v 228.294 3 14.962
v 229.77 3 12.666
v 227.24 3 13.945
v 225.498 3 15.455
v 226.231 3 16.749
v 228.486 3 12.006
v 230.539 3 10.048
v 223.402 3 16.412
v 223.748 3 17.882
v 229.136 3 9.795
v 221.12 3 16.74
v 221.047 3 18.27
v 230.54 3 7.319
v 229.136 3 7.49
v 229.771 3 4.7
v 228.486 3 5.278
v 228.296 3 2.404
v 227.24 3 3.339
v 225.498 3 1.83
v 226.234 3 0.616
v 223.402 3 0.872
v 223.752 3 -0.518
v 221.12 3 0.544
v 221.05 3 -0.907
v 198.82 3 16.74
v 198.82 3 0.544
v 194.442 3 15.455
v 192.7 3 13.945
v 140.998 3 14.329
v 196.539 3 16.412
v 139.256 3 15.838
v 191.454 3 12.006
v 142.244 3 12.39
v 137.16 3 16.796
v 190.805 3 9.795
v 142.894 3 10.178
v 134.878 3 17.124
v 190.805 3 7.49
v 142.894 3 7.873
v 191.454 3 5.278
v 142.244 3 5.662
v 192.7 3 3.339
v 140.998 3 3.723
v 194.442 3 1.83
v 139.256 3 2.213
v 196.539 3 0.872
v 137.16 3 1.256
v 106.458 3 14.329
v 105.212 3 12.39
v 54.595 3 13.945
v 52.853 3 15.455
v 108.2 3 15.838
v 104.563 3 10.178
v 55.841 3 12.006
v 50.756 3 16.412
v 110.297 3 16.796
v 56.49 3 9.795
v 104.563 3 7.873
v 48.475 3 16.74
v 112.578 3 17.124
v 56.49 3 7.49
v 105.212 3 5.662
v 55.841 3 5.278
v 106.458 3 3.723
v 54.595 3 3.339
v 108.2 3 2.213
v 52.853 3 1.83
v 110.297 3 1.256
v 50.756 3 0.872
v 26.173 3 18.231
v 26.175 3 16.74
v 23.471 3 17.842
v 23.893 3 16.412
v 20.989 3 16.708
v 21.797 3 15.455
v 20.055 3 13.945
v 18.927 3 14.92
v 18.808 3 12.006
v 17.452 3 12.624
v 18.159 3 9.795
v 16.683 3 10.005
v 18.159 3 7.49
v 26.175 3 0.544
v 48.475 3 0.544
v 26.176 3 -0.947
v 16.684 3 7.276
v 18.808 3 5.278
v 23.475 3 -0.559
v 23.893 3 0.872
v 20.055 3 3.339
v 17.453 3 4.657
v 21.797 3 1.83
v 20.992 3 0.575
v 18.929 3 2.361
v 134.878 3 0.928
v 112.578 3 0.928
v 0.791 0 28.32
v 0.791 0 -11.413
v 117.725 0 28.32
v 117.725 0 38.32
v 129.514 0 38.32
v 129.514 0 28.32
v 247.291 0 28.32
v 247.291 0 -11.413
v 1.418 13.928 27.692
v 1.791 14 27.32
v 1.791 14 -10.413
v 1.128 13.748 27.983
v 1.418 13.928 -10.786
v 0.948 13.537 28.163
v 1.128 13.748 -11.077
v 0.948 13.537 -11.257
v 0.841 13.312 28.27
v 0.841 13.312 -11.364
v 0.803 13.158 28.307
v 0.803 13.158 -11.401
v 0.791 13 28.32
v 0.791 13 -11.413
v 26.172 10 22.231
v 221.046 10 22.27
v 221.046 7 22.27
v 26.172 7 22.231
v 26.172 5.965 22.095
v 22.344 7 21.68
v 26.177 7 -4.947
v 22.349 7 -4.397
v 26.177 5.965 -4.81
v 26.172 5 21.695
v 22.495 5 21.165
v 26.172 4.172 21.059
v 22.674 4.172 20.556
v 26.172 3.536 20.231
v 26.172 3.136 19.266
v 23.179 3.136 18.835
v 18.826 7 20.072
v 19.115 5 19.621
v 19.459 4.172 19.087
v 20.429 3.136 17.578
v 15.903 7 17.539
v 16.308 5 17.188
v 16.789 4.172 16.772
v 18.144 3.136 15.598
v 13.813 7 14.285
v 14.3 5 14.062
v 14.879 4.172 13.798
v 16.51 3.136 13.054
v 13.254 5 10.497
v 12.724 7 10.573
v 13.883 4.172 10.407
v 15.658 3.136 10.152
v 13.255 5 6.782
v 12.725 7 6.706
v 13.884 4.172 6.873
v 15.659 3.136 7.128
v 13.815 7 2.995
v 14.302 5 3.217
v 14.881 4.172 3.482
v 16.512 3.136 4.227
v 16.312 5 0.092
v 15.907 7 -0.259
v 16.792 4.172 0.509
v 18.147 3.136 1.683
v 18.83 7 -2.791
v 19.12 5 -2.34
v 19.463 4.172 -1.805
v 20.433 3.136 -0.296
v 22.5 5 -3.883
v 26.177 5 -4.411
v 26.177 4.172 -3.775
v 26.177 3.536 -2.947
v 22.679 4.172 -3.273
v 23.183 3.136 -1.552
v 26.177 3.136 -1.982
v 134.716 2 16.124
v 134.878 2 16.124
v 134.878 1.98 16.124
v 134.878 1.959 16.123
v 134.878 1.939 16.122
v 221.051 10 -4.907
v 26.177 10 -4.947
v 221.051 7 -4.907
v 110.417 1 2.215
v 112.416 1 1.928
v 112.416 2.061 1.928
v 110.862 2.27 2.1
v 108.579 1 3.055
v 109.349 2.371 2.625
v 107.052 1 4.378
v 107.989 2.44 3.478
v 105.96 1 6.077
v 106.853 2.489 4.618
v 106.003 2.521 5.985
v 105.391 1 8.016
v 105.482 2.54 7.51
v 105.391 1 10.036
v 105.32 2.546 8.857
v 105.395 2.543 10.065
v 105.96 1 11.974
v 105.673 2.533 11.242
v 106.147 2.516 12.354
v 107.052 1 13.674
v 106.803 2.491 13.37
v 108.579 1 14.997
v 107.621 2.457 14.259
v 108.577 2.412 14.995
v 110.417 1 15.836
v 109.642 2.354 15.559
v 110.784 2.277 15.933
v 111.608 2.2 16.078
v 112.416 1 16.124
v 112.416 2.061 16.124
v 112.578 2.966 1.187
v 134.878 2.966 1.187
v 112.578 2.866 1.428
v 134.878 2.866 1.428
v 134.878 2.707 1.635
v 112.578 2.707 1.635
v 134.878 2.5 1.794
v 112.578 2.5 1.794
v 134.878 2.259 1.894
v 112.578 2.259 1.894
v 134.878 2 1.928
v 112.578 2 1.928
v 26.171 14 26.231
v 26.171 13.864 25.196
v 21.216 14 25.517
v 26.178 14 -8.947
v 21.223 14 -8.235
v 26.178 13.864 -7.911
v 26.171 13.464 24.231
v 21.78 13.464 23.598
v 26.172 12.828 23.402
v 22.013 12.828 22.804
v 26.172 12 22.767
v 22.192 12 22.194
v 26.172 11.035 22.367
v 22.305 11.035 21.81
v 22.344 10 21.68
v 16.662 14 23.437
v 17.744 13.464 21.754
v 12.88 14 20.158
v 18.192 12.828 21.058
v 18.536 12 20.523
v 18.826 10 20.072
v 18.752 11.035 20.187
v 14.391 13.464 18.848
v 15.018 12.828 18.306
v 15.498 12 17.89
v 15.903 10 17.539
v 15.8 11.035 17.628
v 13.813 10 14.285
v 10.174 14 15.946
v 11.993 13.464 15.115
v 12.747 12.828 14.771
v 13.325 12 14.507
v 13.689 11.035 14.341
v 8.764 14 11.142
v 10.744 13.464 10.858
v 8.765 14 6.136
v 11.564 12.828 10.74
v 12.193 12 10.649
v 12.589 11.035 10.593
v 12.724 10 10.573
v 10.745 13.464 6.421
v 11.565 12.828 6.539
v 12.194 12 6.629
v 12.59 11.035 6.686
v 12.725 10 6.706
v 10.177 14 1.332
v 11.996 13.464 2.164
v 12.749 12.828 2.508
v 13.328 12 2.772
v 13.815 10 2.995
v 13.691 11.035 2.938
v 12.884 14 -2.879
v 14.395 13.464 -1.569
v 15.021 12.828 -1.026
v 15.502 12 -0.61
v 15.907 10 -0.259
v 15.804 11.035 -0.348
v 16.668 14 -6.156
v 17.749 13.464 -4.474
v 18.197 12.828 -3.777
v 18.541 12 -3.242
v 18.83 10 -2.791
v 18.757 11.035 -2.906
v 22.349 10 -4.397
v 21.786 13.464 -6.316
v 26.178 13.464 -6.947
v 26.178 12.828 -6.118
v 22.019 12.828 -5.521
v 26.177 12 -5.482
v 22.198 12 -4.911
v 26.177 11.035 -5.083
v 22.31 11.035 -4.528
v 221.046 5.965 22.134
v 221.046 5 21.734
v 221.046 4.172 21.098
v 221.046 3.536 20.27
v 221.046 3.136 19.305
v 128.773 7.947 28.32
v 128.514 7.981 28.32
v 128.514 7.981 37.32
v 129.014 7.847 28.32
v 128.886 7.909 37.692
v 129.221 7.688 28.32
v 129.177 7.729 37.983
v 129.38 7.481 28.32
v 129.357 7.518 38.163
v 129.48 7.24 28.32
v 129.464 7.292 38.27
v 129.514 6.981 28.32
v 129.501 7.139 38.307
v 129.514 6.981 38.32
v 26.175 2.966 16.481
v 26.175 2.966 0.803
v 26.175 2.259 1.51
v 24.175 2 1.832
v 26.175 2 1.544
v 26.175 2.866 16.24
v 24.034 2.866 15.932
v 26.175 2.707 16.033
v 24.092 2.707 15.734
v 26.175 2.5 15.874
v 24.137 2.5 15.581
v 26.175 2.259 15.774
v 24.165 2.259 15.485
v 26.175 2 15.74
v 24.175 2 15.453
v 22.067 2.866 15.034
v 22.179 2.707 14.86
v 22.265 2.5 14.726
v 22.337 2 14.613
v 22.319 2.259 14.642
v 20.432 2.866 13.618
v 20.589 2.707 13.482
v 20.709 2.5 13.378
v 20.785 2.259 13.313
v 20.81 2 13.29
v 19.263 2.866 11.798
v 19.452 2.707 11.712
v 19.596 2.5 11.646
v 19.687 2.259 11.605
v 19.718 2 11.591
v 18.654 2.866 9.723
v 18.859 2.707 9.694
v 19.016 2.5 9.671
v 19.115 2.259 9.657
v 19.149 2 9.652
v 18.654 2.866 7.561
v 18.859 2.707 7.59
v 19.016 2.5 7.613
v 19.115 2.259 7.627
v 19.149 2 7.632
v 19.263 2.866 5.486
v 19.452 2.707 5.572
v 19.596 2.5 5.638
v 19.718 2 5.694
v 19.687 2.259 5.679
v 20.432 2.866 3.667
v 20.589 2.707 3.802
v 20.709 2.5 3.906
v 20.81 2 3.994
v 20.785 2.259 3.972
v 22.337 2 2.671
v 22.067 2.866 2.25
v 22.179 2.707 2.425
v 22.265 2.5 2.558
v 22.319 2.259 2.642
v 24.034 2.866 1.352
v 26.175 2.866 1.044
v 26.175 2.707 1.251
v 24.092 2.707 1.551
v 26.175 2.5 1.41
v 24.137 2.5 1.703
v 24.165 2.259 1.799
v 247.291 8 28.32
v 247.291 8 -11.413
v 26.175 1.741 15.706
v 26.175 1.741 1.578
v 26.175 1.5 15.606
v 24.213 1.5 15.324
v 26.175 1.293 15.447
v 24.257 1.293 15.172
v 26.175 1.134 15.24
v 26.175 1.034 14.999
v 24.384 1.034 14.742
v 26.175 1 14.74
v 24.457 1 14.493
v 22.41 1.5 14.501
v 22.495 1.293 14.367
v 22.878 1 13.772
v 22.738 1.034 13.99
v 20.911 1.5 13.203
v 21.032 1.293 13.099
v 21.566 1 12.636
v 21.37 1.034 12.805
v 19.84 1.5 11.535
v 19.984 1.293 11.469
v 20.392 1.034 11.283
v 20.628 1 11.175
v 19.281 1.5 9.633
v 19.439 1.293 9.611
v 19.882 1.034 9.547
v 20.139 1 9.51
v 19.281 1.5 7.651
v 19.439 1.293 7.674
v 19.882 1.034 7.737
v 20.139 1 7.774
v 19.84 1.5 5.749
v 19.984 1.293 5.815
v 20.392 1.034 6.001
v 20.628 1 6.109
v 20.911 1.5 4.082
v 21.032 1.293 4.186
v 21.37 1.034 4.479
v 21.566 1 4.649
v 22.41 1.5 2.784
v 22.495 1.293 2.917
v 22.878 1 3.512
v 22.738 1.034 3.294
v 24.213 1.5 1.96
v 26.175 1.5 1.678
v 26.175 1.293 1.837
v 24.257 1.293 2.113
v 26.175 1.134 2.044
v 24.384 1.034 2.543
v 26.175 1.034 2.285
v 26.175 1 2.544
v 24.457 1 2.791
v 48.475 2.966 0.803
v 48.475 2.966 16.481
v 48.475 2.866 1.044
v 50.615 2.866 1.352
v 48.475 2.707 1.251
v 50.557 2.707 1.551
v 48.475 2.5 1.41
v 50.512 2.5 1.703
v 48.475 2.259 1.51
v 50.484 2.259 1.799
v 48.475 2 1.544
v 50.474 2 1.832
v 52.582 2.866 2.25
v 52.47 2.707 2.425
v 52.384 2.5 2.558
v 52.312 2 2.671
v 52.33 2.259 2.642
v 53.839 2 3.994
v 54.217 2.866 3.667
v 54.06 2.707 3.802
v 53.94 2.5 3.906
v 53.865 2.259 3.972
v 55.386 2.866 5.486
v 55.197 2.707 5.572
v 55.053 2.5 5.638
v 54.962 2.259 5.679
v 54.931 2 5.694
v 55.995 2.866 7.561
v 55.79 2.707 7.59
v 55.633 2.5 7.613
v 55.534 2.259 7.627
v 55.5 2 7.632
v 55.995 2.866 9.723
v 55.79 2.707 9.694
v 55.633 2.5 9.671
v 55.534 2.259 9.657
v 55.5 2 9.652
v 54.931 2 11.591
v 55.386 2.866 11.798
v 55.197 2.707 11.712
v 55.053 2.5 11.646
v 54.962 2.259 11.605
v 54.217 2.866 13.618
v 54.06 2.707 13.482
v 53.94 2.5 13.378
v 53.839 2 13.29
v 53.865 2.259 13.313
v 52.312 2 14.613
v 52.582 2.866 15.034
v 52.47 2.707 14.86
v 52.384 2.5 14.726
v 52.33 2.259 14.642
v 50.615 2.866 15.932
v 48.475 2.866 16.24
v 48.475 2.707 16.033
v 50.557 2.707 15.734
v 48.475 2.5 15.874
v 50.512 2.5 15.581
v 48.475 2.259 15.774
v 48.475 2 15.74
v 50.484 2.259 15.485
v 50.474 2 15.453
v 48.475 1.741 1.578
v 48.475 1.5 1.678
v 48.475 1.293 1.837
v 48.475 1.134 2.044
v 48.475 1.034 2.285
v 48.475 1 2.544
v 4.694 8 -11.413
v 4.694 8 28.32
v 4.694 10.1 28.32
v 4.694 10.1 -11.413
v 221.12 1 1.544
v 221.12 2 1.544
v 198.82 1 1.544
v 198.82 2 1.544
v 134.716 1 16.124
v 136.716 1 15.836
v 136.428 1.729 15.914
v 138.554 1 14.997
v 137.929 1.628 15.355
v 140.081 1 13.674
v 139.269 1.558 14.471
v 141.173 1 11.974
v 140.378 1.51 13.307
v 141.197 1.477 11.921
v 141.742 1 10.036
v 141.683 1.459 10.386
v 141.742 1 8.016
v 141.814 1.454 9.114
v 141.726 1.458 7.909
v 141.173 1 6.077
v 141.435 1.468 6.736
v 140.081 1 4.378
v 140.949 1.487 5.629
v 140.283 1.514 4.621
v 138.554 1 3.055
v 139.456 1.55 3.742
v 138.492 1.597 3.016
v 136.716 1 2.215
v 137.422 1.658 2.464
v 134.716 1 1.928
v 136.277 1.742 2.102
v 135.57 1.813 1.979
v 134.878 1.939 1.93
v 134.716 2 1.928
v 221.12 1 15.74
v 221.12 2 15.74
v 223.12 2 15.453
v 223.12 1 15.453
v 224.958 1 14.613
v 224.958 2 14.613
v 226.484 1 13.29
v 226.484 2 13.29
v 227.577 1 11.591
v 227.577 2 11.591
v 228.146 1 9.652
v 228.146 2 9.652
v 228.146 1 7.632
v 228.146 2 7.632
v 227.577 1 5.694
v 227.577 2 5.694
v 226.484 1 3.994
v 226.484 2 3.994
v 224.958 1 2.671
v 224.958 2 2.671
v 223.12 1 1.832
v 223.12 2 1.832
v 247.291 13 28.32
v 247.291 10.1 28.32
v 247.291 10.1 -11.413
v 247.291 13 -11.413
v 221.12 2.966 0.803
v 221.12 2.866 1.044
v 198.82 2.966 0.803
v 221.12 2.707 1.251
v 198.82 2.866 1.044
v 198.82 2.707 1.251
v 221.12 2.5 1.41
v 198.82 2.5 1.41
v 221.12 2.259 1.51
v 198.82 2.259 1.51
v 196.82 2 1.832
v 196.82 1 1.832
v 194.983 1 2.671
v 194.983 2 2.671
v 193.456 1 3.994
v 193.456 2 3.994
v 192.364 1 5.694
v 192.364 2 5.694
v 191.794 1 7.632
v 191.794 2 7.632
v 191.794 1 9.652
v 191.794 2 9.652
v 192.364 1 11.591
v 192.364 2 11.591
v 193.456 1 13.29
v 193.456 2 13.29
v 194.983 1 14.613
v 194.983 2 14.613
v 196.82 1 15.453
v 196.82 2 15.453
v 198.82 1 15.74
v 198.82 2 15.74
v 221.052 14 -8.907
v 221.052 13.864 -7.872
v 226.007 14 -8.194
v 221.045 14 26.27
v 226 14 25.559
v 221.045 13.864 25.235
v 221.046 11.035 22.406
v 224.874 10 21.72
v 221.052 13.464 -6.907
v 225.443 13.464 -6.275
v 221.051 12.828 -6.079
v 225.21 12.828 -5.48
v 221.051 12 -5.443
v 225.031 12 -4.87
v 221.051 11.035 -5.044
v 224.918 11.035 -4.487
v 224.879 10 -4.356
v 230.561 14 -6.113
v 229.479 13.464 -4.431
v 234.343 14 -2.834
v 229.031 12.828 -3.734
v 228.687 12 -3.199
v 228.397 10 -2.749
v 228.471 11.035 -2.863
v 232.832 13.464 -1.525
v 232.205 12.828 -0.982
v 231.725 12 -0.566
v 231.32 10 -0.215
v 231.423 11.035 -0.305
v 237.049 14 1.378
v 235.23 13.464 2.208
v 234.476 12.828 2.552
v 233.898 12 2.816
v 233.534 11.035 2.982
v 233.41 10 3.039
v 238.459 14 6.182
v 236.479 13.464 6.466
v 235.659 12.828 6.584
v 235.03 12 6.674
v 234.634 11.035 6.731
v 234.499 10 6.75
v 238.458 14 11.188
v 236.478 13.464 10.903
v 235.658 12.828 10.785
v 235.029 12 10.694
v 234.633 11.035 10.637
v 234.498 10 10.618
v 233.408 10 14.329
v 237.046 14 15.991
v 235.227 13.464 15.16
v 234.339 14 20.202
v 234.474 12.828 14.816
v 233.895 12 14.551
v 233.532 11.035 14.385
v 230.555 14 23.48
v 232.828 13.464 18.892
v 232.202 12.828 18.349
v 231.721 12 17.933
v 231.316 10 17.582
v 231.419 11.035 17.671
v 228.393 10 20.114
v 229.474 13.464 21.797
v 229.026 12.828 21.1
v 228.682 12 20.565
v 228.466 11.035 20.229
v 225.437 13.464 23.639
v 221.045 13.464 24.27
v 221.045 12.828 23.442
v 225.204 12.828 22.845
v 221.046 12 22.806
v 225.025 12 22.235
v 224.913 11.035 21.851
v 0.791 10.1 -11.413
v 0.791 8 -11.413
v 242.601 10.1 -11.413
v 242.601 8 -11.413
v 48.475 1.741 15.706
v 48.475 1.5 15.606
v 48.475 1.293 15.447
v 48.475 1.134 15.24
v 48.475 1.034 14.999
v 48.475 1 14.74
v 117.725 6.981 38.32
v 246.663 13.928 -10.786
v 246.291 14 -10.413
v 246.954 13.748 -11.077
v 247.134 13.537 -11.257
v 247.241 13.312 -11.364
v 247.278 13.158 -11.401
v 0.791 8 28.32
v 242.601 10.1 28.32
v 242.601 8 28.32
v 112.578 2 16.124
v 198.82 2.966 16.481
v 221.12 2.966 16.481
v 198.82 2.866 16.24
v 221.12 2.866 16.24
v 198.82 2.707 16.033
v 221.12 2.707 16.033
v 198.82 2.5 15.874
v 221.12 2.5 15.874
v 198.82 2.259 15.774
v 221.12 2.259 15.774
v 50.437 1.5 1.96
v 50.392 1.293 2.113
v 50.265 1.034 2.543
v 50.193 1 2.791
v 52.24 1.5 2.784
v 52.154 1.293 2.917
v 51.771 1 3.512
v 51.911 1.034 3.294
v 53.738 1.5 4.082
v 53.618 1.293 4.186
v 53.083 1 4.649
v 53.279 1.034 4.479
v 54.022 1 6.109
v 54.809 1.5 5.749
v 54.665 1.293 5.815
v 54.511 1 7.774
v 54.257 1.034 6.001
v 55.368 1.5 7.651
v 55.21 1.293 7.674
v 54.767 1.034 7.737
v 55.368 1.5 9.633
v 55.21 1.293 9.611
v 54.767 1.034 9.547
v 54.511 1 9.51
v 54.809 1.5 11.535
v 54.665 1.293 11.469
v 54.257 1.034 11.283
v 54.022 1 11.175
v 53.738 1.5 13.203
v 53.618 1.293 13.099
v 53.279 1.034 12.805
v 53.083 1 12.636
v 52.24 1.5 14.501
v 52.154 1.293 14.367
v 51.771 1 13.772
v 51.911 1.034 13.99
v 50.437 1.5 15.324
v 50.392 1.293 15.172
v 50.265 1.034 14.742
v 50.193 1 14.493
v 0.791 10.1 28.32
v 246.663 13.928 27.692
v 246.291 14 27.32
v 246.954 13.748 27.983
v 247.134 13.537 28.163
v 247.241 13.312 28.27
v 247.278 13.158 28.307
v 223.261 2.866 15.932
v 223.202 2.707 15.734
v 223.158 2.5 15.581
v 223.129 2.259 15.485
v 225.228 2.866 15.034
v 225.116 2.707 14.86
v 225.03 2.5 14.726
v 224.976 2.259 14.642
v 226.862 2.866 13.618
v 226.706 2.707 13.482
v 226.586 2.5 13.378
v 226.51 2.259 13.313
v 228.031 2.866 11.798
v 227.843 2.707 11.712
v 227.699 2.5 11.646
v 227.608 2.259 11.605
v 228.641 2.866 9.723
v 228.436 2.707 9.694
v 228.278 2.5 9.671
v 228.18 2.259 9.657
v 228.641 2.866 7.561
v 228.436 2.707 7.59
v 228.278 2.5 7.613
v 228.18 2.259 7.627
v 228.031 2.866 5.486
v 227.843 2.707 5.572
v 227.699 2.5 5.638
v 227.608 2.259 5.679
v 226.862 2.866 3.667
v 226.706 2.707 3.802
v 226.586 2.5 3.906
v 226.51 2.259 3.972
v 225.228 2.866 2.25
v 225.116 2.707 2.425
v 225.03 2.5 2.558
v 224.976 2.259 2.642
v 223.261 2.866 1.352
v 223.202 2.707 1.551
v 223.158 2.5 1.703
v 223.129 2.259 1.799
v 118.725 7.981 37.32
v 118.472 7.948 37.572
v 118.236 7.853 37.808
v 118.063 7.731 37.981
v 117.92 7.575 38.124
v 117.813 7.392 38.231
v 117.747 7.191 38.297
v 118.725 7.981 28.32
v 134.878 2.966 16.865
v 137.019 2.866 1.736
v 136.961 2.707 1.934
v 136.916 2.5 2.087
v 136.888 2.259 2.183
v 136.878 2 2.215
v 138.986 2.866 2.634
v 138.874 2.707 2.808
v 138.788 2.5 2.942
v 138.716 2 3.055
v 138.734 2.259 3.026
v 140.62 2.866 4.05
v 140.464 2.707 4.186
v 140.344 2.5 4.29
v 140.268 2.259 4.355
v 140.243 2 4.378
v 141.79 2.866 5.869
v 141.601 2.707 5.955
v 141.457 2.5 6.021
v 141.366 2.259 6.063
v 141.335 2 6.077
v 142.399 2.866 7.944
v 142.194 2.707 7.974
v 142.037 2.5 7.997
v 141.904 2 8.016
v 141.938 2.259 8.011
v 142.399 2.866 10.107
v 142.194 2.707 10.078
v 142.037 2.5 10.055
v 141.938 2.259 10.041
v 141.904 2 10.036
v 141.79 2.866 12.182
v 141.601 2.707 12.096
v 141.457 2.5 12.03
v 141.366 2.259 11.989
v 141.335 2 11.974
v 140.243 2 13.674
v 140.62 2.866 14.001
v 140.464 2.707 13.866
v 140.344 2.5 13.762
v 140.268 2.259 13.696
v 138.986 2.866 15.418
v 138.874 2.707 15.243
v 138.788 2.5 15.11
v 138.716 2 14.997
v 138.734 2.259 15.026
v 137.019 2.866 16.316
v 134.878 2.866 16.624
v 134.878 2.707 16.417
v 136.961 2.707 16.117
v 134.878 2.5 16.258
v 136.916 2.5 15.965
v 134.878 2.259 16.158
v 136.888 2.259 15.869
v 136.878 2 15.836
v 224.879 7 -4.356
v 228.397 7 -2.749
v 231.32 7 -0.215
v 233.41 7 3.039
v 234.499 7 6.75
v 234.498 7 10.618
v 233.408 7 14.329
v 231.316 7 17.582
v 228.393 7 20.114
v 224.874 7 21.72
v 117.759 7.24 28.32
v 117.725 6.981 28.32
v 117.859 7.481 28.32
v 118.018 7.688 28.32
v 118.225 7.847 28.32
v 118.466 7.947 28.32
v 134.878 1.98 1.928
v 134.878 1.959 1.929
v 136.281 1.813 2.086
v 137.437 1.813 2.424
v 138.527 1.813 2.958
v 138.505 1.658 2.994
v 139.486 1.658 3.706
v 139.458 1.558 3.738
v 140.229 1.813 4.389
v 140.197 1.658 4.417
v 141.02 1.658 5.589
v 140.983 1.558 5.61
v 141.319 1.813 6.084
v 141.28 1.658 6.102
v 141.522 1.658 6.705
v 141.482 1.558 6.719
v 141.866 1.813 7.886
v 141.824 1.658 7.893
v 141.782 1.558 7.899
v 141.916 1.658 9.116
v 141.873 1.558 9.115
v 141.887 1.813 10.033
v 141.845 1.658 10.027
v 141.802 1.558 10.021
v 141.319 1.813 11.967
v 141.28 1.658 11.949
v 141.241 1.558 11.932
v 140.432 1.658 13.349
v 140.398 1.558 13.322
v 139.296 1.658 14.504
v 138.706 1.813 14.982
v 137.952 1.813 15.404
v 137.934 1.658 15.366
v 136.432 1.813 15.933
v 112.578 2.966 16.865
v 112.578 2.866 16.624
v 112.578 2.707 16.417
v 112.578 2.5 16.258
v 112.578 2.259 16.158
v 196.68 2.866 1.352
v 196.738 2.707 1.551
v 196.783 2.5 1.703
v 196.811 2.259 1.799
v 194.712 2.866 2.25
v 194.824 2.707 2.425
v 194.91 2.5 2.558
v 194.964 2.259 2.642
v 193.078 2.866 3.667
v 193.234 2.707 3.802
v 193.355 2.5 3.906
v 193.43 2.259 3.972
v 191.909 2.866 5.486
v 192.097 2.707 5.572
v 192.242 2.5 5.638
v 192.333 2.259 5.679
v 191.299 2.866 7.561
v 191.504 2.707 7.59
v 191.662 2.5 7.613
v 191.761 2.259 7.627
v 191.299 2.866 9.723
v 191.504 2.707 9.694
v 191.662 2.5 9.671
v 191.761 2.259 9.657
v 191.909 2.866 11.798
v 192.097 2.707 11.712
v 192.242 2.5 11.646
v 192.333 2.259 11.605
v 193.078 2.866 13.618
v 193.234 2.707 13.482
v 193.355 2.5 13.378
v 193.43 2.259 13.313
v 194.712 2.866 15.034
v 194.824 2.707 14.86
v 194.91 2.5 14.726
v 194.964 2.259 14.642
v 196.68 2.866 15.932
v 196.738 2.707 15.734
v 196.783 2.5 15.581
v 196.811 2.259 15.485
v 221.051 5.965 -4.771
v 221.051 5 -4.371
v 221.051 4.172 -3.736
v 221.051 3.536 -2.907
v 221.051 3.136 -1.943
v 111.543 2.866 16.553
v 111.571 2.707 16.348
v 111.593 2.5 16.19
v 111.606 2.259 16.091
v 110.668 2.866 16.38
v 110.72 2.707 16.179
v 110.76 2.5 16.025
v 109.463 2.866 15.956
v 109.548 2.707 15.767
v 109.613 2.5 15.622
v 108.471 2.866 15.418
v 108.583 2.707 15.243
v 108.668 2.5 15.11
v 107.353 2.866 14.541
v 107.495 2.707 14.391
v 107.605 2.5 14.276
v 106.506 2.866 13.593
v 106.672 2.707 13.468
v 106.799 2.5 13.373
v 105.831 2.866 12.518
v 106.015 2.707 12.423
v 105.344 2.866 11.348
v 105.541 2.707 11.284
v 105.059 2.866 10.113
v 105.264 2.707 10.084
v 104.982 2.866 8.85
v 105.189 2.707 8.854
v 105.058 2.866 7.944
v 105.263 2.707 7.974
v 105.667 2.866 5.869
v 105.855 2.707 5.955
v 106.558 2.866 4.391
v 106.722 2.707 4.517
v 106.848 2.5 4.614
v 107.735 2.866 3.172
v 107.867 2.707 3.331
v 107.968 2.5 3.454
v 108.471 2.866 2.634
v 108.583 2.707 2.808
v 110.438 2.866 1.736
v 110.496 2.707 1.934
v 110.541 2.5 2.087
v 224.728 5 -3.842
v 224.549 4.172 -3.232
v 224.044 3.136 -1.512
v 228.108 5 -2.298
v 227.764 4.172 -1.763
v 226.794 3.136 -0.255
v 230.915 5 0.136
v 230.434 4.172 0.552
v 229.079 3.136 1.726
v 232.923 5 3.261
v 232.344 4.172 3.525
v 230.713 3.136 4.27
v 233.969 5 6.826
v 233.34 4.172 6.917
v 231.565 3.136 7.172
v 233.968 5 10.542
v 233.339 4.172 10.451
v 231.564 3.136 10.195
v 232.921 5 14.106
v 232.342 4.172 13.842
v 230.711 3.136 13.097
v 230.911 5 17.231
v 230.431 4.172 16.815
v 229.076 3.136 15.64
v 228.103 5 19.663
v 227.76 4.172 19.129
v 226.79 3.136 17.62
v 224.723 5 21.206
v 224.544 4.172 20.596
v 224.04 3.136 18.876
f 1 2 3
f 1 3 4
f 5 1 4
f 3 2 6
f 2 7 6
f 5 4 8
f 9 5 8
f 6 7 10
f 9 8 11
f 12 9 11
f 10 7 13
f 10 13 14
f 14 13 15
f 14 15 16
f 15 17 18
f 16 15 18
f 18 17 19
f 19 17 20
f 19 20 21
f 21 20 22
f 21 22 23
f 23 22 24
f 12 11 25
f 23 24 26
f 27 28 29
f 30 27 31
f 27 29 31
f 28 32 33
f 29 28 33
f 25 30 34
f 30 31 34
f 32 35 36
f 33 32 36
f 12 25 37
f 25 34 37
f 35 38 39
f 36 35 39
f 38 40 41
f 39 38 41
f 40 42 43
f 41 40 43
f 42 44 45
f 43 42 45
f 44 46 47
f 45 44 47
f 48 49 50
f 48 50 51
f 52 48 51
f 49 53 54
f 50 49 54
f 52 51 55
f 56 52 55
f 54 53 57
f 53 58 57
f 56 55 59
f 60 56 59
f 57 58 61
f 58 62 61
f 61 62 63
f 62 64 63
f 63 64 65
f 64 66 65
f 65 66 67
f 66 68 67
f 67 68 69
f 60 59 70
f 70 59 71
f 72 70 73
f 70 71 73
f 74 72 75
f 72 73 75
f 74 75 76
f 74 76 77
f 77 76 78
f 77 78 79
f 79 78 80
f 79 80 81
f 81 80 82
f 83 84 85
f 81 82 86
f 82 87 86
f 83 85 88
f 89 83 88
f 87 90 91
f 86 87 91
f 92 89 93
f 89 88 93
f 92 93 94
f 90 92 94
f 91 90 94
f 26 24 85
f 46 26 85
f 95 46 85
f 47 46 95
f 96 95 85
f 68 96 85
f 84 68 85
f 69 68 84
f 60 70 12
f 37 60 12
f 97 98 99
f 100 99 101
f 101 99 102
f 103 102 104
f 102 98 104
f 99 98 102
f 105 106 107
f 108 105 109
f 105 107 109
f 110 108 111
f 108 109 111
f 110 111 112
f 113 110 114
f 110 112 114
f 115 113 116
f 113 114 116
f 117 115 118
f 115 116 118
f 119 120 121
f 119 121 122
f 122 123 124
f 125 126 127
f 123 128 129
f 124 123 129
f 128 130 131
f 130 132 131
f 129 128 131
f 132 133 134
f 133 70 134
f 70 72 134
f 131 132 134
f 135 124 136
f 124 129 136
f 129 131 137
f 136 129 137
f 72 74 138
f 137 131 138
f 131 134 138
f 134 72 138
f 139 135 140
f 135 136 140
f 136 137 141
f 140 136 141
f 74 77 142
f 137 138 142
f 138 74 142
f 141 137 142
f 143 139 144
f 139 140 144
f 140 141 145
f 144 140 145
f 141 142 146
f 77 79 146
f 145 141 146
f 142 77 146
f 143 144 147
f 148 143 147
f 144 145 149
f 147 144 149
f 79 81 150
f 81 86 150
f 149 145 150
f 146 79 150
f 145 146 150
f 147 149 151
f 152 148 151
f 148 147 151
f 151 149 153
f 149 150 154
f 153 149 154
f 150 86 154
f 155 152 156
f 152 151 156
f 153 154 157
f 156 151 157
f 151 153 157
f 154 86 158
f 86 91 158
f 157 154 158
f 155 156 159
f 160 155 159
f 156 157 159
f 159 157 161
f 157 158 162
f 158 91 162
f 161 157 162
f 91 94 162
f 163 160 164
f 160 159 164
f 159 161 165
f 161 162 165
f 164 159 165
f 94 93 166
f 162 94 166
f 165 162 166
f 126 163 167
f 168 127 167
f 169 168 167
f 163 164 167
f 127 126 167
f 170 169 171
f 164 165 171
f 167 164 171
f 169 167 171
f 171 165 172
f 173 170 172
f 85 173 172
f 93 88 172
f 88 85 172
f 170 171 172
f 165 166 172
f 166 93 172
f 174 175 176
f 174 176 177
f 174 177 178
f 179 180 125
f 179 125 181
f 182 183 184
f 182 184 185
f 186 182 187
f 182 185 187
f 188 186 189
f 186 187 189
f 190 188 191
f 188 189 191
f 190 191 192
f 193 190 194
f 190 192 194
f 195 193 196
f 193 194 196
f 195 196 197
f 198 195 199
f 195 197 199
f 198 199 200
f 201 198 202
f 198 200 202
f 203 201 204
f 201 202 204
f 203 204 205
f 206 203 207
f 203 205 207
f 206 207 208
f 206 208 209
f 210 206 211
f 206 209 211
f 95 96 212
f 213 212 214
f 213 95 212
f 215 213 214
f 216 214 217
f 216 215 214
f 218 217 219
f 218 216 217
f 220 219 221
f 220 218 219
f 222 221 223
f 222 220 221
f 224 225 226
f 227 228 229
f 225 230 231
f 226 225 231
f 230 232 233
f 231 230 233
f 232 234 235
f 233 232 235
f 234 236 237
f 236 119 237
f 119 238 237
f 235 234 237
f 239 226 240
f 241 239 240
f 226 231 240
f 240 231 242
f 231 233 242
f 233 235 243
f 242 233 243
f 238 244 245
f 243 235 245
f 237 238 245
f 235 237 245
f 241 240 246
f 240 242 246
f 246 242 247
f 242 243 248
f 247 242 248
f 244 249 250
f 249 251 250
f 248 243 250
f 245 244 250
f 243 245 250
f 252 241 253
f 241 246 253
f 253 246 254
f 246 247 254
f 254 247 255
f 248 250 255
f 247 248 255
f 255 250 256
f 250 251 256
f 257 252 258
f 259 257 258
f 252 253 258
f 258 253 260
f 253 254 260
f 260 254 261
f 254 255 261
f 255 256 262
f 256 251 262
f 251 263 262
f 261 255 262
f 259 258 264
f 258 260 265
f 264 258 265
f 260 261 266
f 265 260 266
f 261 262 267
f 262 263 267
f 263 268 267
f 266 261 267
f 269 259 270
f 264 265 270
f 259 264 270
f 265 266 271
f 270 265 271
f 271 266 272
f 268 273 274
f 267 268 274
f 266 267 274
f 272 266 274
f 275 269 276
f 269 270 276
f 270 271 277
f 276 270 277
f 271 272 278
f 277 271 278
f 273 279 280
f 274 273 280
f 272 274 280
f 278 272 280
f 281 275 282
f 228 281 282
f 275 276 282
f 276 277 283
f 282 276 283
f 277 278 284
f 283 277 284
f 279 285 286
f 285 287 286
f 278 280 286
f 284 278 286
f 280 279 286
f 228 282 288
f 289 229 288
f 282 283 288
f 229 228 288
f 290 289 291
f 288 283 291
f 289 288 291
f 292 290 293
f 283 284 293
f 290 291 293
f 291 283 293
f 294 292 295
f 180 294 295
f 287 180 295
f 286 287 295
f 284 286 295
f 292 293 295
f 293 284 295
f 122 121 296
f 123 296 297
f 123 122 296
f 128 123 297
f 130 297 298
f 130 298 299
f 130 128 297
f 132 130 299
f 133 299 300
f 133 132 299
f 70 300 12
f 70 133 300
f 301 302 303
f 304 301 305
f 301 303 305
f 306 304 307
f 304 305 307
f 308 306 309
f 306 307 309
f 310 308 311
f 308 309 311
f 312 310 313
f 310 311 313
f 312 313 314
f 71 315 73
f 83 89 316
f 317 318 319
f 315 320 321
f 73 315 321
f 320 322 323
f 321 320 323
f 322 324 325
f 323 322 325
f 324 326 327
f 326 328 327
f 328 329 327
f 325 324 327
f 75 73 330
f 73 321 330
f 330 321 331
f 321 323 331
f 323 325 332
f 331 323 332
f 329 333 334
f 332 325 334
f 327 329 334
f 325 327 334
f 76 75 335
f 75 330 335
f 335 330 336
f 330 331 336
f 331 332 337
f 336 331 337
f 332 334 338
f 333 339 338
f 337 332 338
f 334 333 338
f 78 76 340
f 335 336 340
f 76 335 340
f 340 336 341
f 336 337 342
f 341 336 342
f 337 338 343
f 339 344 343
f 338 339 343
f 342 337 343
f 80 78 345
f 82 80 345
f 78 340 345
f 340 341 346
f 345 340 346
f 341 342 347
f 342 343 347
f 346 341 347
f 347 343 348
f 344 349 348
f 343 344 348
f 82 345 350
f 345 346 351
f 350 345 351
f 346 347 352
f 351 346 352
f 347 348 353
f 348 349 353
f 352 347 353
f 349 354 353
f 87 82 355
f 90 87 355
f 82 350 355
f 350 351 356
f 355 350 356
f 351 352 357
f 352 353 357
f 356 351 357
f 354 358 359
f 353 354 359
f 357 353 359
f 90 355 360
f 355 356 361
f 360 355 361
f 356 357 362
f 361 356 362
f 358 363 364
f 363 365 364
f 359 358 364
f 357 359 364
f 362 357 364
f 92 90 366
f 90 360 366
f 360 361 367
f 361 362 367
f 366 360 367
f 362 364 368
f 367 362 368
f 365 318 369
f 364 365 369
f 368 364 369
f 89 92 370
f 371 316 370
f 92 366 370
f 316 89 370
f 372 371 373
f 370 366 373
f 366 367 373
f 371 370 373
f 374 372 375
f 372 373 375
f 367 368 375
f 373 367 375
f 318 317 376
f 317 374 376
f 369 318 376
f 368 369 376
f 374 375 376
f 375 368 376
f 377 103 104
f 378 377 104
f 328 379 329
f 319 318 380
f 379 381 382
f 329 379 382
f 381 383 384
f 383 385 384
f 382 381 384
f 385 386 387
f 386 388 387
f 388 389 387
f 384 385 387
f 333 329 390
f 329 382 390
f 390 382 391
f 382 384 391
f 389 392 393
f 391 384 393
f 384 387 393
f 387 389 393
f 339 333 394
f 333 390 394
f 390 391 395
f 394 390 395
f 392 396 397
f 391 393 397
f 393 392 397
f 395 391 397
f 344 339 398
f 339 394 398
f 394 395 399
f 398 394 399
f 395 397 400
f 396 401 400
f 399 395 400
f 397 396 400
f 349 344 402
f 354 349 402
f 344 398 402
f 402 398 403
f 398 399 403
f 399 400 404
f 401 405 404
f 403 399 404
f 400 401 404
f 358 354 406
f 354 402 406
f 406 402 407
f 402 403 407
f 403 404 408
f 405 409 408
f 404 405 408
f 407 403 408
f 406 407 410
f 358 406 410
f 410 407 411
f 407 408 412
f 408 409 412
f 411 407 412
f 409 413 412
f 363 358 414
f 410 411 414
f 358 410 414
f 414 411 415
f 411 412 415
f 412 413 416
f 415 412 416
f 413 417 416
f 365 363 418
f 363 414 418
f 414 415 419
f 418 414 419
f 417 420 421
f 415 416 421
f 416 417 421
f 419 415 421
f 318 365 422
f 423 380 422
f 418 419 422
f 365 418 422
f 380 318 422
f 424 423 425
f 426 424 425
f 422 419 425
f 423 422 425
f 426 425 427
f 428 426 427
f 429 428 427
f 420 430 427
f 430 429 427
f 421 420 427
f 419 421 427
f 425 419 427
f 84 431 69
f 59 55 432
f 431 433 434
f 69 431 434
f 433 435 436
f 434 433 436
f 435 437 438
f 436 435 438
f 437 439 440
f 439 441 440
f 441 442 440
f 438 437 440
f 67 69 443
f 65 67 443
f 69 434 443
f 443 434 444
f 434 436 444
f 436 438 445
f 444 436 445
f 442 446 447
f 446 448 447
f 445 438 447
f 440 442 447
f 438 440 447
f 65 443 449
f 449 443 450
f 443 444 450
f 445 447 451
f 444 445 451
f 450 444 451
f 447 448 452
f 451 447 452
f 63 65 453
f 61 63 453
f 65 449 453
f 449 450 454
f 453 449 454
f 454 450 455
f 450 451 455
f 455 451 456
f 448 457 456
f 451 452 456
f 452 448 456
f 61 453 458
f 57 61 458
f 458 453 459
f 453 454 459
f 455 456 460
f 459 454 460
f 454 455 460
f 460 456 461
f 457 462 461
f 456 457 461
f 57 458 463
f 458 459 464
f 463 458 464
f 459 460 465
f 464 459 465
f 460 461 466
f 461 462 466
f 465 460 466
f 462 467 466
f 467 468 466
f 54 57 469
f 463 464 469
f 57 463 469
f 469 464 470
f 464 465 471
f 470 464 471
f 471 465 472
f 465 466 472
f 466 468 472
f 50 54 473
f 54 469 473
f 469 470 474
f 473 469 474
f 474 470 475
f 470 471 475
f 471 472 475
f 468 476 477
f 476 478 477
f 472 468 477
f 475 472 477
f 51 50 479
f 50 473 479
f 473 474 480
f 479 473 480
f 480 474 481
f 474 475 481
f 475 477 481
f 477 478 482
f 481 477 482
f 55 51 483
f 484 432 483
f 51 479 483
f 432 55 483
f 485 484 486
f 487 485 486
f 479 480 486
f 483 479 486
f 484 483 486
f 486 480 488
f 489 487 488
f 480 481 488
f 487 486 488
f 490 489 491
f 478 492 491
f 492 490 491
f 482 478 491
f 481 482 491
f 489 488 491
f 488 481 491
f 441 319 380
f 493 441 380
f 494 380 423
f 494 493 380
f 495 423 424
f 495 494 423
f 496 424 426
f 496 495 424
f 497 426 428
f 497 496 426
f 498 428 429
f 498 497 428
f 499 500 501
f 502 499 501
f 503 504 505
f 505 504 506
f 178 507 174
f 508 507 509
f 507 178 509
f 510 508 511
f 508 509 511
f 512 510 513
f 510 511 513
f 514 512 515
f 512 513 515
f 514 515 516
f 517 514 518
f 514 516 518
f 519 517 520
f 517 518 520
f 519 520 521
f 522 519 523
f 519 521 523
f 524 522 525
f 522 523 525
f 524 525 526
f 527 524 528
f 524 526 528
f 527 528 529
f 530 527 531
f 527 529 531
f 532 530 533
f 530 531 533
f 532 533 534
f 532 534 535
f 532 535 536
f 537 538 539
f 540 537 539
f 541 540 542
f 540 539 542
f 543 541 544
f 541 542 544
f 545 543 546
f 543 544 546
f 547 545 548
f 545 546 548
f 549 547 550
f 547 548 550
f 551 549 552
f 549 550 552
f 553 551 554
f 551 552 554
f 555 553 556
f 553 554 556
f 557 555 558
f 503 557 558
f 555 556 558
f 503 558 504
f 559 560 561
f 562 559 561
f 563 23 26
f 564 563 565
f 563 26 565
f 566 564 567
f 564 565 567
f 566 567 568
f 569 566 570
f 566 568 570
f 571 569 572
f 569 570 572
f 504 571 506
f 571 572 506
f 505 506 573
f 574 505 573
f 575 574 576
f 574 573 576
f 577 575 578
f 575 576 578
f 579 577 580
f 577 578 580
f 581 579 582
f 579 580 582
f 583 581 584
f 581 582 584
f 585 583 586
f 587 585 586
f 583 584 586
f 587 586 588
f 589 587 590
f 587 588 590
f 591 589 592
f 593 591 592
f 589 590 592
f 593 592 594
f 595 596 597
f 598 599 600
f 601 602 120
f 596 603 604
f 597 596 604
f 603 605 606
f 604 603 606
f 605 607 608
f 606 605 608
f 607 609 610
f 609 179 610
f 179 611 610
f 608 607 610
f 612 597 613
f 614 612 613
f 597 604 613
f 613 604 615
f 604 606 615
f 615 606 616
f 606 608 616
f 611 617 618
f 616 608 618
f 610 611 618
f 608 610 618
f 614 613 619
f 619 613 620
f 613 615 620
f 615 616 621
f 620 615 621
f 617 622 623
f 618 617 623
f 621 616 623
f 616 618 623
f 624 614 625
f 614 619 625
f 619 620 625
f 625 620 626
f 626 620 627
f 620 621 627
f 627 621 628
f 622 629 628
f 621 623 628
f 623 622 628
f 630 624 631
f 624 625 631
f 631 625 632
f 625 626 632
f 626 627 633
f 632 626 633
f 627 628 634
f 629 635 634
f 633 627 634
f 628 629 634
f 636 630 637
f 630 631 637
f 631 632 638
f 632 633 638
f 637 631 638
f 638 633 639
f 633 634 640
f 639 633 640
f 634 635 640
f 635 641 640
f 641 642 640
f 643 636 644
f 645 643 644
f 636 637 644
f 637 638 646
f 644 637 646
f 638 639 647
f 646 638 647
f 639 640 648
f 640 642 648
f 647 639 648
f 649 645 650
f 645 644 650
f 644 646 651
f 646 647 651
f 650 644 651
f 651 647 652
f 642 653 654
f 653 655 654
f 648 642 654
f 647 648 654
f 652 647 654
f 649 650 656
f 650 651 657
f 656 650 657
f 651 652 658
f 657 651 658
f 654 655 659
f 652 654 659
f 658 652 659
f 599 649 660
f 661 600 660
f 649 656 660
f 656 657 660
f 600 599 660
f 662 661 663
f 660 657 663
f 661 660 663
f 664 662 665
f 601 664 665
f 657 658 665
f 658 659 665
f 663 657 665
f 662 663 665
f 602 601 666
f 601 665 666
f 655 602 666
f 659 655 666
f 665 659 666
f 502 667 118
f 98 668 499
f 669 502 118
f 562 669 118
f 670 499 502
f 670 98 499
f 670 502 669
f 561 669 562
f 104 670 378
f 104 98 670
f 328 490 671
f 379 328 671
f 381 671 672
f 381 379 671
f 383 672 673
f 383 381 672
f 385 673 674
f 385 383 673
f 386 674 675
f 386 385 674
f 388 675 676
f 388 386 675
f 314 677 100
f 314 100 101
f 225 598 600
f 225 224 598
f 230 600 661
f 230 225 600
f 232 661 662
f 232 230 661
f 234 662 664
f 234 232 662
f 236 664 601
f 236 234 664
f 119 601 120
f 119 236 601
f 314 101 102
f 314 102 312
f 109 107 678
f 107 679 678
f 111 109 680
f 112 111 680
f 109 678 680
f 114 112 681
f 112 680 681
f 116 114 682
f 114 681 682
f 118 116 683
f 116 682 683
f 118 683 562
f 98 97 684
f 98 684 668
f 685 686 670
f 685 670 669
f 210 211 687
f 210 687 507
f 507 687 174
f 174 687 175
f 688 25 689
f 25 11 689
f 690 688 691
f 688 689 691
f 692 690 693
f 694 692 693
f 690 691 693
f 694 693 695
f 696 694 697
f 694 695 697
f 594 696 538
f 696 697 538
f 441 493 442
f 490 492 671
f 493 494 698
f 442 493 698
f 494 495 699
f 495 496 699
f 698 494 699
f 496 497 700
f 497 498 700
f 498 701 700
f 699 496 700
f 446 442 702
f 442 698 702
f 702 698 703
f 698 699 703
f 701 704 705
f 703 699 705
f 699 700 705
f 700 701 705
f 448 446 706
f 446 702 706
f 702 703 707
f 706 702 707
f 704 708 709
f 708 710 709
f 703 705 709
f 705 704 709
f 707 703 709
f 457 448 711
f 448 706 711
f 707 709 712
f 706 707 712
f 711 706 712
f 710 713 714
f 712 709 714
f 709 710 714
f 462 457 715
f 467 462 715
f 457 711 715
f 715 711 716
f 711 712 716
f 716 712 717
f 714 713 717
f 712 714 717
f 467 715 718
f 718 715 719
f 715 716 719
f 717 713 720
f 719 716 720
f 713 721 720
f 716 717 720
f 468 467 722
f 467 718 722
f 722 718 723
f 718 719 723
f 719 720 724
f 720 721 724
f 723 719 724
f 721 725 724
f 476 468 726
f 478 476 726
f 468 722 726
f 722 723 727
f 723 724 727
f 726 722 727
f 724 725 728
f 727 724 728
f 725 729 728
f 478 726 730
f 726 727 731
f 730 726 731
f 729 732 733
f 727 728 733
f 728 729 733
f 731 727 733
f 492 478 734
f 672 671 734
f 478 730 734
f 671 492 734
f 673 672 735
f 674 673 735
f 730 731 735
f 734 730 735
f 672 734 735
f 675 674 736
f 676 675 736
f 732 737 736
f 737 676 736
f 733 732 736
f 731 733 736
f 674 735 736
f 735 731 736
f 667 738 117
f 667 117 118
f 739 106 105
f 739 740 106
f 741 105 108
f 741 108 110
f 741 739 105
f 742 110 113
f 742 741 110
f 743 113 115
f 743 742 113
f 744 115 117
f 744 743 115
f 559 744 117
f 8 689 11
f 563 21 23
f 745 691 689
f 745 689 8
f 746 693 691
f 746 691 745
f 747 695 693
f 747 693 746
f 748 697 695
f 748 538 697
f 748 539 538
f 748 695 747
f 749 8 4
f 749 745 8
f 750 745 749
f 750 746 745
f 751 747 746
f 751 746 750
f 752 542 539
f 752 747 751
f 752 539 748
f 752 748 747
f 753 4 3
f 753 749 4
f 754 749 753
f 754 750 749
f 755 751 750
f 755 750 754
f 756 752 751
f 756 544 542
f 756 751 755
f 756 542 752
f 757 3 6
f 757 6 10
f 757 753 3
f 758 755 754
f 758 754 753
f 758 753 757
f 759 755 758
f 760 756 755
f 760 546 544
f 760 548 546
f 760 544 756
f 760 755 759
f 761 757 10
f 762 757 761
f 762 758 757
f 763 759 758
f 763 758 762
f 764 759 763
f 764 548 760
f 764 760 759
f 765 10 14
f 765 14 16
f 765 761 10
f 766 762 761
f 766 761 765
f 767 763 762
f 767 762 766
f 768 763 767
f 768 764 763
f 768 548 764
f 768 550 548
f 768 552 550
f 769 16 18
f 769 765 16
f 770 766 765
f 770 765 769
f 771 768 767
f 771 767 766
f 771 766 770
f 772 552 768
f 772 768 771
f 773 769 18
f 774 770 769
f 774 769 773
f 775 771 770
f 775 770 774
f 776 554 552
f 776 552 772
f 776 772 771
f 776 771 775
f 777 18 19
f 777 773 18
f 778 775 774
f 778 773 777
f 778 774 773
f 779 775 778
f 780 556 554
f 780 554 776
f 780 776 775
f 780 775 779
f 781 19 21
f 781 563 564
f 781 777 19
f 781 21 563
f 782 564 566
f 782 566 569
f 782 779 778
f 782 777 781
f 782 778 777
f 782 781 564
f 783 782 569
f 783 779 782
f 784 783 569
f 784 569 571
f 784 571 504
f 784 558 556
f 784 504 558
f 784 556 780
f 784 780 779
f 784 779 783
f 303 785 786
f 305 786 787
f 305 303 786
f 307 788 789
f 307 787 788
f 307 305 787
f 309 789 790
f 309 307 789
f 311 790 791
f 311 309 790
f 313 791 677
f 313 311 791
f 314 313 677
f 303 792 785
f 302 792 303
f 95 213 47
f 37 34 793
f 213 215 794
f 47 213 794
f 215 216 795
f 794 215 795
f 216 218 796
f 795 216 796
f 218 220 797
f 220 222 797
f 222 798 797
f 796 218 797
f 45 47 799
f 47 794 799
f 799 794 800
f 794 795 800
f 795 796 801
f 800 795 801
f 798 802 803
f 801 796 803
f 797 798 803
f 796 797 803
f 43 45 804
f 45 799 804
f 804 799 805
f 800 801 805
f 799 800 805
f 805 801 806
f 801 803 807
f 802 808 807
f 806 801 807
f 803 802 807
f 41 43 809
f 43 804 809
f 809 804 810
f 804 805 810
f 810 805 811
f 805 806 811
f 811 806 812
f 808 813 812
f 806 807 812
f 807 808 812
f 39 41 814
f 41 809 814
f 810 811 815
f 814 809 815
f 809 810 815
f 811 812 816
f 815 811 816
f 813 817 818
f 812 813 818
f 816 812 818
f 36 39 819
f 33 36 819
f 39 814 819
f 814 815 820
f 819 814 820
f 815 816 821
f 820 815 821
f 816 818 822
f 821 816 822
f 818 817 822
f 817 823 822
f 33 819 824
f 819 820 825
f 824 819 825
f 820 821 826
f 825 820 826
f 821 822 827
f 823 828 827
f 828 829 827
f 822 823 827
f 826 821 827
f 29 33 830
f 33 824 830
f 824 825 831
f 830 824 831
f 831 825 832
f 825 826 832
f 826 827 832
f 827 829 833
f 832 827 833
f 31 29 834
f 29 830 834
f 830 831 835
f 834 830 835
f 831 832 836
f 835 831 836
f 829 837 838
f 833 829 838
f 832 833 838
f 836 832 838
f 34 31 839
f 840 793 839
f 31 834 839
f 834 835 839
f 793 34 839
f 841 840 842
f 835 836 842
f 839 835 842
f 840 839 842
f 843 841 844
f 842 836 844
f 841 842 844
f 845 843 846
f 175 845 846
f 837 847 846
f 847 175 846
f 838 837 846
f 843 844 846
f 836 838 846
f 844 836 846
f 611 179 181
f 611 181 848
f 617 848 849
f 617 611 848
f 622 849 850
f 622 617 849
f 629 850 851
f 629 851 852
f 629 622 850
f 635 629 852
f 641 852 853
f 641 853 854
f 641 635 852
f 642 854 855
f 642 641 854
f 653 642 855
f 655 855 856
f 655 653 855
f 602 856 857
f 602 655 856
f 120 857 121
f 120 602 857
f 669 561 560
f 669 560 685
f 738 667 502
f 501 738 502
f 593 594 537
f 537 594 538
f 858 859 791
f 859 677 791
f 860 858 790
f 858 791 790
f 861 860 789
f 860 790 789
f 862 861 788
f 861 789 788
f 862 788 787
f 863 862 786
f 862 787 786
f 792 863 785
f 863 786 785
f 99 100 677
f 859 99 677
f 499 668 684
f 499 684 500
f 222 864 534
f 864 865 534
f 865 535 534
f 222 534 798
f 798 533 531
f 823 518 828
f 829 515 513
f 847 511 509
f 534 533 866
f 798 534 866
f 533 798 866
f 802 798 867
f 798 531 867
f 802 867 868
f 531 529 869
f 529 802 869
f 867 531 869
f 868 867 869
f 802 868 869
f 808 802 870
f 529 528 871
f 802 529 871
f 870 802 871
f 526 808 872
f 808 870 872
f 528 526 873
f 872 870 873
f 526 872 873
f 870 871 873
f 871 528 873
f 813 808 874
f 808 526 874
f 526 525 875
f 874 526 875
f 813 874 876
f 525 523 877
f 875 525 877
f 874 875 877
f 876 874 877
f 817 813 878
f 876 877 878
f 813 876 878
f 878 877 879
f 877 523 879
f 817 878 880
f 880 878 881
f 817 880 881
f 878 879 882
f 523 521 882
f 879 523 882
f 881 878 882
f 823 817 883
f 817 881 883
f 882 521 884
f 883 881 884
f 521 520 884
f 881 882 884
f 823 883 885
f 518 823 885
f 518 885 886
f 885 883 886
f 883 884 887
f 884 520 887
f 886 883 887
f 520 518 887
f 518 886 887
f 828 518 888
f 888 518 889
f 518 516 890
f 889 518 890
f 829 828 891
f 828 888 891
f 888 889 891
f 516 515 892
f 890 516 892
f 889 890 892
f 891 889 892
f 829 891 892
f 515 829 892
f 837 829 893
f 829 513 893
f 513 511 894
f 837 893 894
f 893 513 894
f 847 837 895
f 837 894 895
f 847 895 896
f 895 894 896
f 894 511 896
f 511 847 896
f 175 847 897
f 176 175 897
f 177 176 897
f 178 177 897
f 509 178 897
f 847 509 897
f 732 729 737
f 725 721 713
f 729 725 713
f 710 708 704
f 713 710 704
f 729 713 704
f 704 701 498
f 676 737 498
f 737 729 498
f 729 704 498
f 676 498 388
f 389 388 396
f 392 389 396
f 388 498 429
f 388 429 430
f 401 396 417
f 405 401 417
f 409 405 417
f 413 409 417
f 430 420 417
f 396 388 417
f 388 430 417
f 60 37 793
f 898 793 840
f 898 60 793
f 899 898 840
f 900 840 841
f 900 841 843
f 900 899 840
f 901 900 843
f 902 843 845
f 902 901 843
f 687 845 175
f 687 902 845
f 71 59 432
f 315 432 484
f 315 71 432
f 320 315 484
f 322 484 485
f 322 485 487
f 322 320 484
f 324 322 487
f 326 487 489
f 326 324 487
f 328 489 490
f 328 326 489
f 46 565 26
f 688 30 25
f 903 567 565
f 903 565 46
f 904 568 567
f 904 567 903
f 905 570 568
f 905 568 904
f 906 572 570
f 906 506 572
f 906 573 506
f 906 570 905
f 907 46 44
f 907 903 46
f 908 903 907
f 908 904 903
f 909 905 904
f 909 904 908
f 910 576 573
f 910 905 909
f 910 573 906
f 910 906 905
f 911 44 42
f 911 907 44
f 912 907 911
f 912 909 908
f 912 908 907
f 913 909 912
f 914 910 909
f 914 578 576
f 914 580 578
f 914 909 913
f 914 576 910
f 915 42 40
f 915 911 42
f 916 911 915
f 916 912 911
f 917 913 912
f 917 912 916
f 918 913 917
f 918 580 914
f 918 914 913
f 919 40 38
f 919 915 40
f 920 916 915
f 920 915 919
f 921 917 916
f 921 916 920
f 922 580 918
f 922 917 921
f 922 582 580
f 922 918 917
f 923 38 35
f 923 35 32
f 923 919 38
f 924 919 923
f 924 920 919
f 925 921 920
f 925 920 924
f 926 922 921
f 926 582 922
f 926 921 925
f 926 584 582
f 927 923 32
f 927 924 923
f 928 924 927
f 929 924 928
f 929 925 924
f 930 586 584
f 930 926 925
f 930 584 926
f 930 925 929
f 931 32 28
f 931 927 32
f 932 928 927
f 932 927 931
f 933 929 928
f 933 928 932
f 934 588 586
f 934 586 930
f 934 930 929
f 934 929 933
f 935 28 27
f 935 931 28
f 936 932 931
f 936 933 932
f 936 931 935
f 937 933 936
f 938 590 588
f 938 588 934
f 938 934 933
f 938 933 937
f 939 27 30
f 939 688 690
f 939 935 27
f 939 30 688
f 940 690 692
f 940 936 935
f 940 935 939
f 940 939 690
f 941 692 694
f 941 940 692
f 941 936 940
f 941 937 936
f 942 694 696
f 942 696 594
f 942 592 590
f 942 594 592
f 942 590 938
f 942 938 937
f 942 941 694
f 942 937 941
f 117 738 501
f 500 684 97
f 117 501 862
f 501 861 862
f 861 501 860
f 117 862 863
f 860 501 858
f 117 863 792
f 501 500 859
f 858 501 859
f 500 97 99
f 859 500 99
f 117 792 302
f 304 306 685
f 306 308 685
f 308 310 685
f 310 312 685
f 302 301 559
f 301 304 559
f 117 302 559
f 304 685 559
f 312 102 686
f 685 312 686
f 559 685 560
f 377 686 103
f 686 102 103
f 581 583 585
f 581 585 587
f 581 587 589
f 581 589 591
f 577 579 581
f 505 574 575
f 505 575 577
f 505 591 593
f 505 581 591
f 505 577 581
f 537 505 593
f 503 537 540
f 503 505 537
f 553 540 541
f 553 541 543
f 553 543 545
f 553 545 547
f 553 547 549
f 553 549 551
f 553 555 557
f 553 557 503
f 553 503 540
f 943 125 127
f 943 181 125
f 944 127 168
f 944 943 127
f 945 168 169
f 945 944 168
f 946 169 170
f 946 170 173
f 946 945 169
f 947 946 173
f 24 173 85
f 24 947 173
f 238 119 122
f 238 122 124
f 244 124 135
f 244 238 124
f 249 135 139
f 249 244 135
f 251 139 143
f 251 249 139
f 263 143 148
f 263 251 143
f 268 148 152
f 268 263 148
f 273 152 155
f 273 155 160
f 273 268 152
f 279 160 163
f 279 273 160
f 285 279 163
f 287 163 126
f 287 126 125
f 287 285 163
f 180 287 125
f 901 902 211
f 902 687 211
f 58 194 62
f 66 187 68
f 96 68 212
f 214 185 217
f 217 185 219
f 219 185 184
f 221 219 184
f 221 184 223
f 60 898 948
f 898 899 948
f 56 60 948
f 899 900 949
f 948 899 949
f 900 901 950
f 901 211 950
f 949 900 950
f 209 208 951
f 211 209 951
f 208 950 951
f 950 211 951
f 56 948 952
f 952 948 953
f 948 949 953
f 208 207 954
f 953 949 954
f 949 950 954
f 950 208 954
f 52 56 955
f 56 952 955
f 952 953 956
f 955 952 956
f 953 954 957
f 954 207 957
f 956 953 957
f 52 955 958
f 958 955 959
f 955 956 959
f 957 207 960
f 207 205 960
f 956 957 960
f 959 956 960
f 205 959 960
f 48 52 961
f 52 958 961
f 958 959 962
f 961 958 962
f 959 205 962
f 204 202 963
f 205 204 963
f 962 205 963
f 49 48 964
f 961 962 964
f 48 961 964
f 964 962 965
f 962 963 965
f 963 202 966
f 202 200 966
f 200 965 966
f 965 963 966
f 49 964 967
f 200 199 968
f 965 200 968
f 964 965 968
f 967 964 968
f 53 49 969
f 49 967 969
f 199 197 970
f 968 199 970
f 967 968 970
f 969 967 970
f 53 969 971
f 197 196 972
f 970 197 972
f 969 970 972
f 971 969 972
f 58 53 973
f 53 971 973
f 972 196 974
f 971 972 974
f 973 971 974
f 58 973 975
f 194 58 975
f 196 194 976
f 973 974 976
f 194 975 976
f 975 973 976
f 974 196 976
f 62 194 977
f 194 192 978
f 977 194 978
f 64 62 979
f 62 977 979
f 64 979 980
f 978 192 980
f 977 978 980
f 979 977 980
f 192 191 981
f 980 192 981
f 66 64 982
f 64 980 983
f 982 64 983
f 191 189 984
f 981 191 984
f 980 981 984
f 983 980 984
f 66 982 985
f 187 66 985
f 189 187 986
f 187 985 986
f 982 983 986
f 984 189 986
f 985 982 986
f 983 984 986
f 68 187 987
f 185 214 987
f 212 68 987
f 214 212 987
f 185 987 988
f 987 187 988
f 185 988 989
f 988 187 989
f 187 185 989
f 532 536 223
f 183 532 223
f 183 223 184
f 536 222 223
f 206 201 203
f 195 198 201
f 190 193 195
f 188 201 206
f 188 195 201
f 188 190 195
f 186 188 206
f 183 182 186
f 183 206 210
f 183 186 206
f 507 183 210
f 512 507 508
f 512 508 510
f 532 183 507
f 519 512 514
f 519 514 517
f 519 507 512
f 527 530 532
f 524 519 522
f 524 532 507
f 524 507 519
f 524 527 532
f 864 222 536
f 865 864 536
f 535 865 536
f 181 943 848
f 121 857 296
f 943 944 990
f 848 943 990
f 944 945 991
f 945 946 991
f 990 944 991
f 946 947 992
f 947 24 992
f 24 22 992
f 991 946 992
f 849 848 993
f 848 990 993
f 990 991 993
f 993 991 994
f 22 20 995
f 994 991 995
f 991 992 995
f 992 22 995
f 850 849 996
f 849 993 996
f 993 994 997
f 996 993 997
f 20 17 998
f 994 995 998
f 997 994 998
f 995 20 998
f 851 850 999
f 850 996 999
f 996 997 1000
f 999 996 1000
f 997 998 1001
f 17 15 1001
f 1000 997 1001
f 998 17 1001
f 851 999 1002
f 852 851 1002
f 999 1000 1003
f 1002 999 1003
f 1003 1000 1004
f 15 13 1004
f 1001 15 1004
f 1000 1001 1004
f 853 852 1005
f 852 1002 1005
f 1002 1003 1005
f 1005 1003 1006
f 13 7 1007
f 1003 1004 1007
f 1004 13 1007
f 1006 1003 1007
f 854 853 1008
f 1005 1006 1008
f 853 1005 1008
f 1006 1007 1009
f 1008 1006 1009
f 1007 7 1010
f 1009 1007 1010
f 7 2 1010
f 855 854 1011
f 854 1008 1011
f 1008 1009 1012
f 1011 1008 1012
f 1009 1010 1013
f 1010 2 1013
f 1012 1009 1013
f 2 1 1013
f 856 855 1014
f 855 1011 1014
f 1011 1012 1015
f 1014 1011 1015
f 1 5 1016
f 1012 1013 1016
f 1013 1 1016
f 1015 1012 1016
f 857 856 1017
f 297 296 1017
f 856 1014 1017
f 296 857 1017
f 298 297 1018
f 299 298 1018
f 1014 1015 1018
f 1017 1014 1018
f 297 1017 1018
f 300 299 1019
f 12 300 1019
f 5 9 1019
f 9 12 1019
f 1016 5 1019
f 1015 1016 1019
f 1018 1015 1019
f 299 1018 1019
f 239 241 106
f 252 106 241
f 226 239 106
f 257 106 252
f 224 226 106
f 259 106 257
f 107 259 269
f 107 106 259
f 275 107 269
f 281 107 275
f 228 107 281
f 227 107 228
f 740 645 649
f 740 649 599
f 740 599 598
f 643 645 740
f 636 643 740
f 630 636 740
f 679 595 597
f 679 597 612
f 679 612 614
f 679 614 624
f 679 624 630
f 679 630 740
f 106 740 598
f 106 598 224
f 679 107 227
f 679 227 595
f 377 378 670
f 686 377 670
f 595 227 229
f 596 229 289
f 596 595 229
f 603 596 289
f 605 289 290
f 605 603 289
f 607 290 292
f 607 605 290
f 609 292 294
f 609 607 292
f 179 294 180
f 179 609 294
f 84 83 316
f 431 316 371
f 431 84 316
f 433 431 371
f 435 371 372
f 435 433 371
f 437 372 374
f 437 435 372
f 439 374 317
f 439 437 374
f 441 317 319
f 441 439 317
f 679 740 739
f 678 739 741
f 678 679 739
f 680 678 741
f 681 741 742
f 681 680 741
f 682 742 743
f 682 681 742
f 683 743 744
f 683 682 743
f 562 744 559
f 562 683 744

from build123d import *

# Parameters (mm, degrees)
SKETCH1_W           = 246.5
SKETCH1_H           = 39.733186143
BOSS_EXTRUDE1_DEPTH = 14
SKETCH2_W           = 4.694067914
SKETCH2_H           = 2.1
CUT_EXTRUDE1_DEPTH  = 251.853556912
CUT_EXTRUDE3_DEPTH  = 11
FILLET2_R           = 4
CUT_EXTRUDE4_DEPTH  = 2
FILLET6_R           = 1
FILLET8_R           = 1
SKETCH7_W           = 11.788952715
SKETCH7_H           = 7.980899871
BOSS_EXTRUDE2_DEPTH = 10
FILLET7_R           = 1


with BuildPart() as part:
    # Sketch1 → Boss-Extrude1 (new body)
    with BuildSketch(Plane(origin=(0, 0, 0), x_dir=(1, 0, 0), z_dir=(0, 1, 0))):
        with Locations((124.040883242, -8.453184467)):
            Rectangle(SKETCH1_W, SKETCH1_H)
    extrude(amount=BOSS_EXTRUDE1_DEPTH)

    # Sketch2 → Cut-Extrude1 (cut, through all)
    with BuildSketch(Plane.XY.offset(28.319777539)):
        with Locations((2.347033957, 9.05)):
            Rectangle(SKETCH2_W, SKETCH2_H)
    cut_extrude1 = extrude(amount=-CUT_EXTRUDE1_DEPTH, mode=Mode.SUBTRACT)

    # Sketch5 → Cut-Extrude3 (cut)
    with BuildSketch(Plane(origin=(0, 14, 0), x_dir=(1, 0, 0), z_dir=(0, 1, 0))):
        with BuildLine():
            Line((26.177280041, 4.946524414), (221.051198354, 4.907326306))
            ThreePointArc((221.051198354, 4.907326306), (234.637134771, -8.684076724), (221.045731741, -22.270013142))
            Line((221.045731741, -22.270013142), (26.171813428, -22.230815033))
            ThreePointArc((26.171813428, -22.230815033), (12.585877011, -8.639412003), (26.177280041, 4.946524414))
        make_face()
    extrude(amount=-CUT_EXTRUDE3_DEPTH, mode=Mode.SUBTRACT)

    # Fillet2
    fillet2_edges = [part.edges().sort_by_distance(p)[0] for p in [
        (12.585877011, 3, 8.639412003),
        (123.614239198, 3, -4.92692536),
        (234.637134771, 3, 8.684076724),
        (123.608772585, 3, 22.250414087),
        (12.585877011, 14, 8.639412003),
        (123.608772585, 14, 22.250414087),
        (234.637134771, 14, 8.684076724),
        (123.614239198, 14, -4.92692536),
    ]]
    fillet(fillet2_edges, radius=FILLET2_R)

    # Sketch6 → Cut-Extrude4 (cut)
    with BuildSketch(Plane(origin=(0, 3, 0), x_dir=(1, 0, 0), z_dir=(0, 1, 0))):
        with BuildLine():
            Line((26.174546735, -1.544173788), (48.474546735, -1.544173788))
            ThreePointArc((48.474546735, -1.544173788), (55.572518256, -8.64214531), (48.474546735, -15.740116831))
            Line((48.474546735, -15.740116831), (26.174546735, -15.740116831))
            ThreePointArc((26.174546735, -15.740116831), (19.076575213, -8.64214531), (26.174546735, -1.544173788))
        make_face()
        with BuildLine():
            Line((112.578301419, -1.927776302), (134.878301419, -1.927776302))
            ThreePointArc((134.878301419, -1.927776302), (141.97627294, -9.025747823), (134.878301419, -16.123719344))
            Line((134.878301419, -16.123719344), (112.578301419, -16.123719344))
            ThreePointArc((112.578301419, -16.123719344), (105.480329898, -9.025747823), (112.578301419, -1.927776302))
        make_face()
    cut_extrude4 = extrude(amount=-CUT_EXTRUDE4_DEPTH, mode=Mode.SUBTRACT)

    # Fillet6
    fillet6_edges = [part.edges().sort_by_distance(p)[0] for p in [
        (19.076575213, 3, 8.64214531),
        (37.324546735, 3, 1.544173788),
        (55.572518256, 3, 8.64214531),
        (37.324546735, 3, 15.740116831),
        (37.324546735, 1, 1.544173788),
        (55.572518256, 1, 8.64214531),
        (37.324546735, 1, 15.740116831),
        (19.076575213, 1, 8.64214531),
        (105.480329898, 3, 9.025747823),
        (123.728301419, 3, 1.927776302),
        (141.97627294, 3, 9.025747823),
        (123.728301419, 3, 16.123719344),
        (123.728301419, 1, 1.927776302),
        (141.97627294, 1, 9.025747823),
        (123.728301419, 1, 16.123719344),
        (105.480329898, 1, 9.025747823),
    ]]
    fillet(fillet6_edges, radius=FILLET6_R - 0.0001)  # a hair under: the kernel refuses the full size

    # Mirror4: Cut-Extrude4 across plane
    add(cut_extrude4.mirror(Plane(origin=(123.647335387, 0, 0), x_dir=(0, 0, 1), z_dir=(1, 0, 0))), mode=Mode.SUBTRACT)

    # Fillet8
    fillet8_edges = [part.edges().sort_by_distance(p)[0] for p in [
        (228.218095561, 3, 8.64214531),
        (209.97012404, 3, 15.740116831),
        (191.722152519, 3, 8.64214531),
        (209.97012404, 3, 1.544173788),
    ]]
    fillet(fillet8_edges, radius=FILLET8_R)

    # Mirror5: Cut-Extrude1 across plane
    add(cut_extrude1.mirror(Plane(origin=(123.647335387, 0, 0), x_dir=(0, 0, 1), z_dir=(1, 0, 0))), mode=Mode.SUBTRACT)

    # Sketch7 → Boss-Extrude2 (add)
    with BuildSketch(Plane.XY.offset(28.319777539)):
        with Locations((123.619253178, 3.990449936)):
            Rectangle(SKETCH7_W, SKETCH7_H)
    extrude(amount=BOSS_EXTRUDE2_DEPTH)

    # Fillet7
    fillet7_edges = [part.edges().sort_by_distance(p)[0] for p in [
        (0.790883242, 14, 8.453184468),
        (124.040883242, 14, 28.319777539),
        (129.513729535, 7.980899871, 33.319777539),
        (117.72477682, 7.980899871, 33.319777539),
        (123.619253178, 7.980899871, 38.319777539),
        (247.290883242, 14, 8.453184468),
        (124.040883242, 14, -11.413408604),
    ]]
    fillet(fillet7_edges, radius=FILLET7_R)


solid = part.part
